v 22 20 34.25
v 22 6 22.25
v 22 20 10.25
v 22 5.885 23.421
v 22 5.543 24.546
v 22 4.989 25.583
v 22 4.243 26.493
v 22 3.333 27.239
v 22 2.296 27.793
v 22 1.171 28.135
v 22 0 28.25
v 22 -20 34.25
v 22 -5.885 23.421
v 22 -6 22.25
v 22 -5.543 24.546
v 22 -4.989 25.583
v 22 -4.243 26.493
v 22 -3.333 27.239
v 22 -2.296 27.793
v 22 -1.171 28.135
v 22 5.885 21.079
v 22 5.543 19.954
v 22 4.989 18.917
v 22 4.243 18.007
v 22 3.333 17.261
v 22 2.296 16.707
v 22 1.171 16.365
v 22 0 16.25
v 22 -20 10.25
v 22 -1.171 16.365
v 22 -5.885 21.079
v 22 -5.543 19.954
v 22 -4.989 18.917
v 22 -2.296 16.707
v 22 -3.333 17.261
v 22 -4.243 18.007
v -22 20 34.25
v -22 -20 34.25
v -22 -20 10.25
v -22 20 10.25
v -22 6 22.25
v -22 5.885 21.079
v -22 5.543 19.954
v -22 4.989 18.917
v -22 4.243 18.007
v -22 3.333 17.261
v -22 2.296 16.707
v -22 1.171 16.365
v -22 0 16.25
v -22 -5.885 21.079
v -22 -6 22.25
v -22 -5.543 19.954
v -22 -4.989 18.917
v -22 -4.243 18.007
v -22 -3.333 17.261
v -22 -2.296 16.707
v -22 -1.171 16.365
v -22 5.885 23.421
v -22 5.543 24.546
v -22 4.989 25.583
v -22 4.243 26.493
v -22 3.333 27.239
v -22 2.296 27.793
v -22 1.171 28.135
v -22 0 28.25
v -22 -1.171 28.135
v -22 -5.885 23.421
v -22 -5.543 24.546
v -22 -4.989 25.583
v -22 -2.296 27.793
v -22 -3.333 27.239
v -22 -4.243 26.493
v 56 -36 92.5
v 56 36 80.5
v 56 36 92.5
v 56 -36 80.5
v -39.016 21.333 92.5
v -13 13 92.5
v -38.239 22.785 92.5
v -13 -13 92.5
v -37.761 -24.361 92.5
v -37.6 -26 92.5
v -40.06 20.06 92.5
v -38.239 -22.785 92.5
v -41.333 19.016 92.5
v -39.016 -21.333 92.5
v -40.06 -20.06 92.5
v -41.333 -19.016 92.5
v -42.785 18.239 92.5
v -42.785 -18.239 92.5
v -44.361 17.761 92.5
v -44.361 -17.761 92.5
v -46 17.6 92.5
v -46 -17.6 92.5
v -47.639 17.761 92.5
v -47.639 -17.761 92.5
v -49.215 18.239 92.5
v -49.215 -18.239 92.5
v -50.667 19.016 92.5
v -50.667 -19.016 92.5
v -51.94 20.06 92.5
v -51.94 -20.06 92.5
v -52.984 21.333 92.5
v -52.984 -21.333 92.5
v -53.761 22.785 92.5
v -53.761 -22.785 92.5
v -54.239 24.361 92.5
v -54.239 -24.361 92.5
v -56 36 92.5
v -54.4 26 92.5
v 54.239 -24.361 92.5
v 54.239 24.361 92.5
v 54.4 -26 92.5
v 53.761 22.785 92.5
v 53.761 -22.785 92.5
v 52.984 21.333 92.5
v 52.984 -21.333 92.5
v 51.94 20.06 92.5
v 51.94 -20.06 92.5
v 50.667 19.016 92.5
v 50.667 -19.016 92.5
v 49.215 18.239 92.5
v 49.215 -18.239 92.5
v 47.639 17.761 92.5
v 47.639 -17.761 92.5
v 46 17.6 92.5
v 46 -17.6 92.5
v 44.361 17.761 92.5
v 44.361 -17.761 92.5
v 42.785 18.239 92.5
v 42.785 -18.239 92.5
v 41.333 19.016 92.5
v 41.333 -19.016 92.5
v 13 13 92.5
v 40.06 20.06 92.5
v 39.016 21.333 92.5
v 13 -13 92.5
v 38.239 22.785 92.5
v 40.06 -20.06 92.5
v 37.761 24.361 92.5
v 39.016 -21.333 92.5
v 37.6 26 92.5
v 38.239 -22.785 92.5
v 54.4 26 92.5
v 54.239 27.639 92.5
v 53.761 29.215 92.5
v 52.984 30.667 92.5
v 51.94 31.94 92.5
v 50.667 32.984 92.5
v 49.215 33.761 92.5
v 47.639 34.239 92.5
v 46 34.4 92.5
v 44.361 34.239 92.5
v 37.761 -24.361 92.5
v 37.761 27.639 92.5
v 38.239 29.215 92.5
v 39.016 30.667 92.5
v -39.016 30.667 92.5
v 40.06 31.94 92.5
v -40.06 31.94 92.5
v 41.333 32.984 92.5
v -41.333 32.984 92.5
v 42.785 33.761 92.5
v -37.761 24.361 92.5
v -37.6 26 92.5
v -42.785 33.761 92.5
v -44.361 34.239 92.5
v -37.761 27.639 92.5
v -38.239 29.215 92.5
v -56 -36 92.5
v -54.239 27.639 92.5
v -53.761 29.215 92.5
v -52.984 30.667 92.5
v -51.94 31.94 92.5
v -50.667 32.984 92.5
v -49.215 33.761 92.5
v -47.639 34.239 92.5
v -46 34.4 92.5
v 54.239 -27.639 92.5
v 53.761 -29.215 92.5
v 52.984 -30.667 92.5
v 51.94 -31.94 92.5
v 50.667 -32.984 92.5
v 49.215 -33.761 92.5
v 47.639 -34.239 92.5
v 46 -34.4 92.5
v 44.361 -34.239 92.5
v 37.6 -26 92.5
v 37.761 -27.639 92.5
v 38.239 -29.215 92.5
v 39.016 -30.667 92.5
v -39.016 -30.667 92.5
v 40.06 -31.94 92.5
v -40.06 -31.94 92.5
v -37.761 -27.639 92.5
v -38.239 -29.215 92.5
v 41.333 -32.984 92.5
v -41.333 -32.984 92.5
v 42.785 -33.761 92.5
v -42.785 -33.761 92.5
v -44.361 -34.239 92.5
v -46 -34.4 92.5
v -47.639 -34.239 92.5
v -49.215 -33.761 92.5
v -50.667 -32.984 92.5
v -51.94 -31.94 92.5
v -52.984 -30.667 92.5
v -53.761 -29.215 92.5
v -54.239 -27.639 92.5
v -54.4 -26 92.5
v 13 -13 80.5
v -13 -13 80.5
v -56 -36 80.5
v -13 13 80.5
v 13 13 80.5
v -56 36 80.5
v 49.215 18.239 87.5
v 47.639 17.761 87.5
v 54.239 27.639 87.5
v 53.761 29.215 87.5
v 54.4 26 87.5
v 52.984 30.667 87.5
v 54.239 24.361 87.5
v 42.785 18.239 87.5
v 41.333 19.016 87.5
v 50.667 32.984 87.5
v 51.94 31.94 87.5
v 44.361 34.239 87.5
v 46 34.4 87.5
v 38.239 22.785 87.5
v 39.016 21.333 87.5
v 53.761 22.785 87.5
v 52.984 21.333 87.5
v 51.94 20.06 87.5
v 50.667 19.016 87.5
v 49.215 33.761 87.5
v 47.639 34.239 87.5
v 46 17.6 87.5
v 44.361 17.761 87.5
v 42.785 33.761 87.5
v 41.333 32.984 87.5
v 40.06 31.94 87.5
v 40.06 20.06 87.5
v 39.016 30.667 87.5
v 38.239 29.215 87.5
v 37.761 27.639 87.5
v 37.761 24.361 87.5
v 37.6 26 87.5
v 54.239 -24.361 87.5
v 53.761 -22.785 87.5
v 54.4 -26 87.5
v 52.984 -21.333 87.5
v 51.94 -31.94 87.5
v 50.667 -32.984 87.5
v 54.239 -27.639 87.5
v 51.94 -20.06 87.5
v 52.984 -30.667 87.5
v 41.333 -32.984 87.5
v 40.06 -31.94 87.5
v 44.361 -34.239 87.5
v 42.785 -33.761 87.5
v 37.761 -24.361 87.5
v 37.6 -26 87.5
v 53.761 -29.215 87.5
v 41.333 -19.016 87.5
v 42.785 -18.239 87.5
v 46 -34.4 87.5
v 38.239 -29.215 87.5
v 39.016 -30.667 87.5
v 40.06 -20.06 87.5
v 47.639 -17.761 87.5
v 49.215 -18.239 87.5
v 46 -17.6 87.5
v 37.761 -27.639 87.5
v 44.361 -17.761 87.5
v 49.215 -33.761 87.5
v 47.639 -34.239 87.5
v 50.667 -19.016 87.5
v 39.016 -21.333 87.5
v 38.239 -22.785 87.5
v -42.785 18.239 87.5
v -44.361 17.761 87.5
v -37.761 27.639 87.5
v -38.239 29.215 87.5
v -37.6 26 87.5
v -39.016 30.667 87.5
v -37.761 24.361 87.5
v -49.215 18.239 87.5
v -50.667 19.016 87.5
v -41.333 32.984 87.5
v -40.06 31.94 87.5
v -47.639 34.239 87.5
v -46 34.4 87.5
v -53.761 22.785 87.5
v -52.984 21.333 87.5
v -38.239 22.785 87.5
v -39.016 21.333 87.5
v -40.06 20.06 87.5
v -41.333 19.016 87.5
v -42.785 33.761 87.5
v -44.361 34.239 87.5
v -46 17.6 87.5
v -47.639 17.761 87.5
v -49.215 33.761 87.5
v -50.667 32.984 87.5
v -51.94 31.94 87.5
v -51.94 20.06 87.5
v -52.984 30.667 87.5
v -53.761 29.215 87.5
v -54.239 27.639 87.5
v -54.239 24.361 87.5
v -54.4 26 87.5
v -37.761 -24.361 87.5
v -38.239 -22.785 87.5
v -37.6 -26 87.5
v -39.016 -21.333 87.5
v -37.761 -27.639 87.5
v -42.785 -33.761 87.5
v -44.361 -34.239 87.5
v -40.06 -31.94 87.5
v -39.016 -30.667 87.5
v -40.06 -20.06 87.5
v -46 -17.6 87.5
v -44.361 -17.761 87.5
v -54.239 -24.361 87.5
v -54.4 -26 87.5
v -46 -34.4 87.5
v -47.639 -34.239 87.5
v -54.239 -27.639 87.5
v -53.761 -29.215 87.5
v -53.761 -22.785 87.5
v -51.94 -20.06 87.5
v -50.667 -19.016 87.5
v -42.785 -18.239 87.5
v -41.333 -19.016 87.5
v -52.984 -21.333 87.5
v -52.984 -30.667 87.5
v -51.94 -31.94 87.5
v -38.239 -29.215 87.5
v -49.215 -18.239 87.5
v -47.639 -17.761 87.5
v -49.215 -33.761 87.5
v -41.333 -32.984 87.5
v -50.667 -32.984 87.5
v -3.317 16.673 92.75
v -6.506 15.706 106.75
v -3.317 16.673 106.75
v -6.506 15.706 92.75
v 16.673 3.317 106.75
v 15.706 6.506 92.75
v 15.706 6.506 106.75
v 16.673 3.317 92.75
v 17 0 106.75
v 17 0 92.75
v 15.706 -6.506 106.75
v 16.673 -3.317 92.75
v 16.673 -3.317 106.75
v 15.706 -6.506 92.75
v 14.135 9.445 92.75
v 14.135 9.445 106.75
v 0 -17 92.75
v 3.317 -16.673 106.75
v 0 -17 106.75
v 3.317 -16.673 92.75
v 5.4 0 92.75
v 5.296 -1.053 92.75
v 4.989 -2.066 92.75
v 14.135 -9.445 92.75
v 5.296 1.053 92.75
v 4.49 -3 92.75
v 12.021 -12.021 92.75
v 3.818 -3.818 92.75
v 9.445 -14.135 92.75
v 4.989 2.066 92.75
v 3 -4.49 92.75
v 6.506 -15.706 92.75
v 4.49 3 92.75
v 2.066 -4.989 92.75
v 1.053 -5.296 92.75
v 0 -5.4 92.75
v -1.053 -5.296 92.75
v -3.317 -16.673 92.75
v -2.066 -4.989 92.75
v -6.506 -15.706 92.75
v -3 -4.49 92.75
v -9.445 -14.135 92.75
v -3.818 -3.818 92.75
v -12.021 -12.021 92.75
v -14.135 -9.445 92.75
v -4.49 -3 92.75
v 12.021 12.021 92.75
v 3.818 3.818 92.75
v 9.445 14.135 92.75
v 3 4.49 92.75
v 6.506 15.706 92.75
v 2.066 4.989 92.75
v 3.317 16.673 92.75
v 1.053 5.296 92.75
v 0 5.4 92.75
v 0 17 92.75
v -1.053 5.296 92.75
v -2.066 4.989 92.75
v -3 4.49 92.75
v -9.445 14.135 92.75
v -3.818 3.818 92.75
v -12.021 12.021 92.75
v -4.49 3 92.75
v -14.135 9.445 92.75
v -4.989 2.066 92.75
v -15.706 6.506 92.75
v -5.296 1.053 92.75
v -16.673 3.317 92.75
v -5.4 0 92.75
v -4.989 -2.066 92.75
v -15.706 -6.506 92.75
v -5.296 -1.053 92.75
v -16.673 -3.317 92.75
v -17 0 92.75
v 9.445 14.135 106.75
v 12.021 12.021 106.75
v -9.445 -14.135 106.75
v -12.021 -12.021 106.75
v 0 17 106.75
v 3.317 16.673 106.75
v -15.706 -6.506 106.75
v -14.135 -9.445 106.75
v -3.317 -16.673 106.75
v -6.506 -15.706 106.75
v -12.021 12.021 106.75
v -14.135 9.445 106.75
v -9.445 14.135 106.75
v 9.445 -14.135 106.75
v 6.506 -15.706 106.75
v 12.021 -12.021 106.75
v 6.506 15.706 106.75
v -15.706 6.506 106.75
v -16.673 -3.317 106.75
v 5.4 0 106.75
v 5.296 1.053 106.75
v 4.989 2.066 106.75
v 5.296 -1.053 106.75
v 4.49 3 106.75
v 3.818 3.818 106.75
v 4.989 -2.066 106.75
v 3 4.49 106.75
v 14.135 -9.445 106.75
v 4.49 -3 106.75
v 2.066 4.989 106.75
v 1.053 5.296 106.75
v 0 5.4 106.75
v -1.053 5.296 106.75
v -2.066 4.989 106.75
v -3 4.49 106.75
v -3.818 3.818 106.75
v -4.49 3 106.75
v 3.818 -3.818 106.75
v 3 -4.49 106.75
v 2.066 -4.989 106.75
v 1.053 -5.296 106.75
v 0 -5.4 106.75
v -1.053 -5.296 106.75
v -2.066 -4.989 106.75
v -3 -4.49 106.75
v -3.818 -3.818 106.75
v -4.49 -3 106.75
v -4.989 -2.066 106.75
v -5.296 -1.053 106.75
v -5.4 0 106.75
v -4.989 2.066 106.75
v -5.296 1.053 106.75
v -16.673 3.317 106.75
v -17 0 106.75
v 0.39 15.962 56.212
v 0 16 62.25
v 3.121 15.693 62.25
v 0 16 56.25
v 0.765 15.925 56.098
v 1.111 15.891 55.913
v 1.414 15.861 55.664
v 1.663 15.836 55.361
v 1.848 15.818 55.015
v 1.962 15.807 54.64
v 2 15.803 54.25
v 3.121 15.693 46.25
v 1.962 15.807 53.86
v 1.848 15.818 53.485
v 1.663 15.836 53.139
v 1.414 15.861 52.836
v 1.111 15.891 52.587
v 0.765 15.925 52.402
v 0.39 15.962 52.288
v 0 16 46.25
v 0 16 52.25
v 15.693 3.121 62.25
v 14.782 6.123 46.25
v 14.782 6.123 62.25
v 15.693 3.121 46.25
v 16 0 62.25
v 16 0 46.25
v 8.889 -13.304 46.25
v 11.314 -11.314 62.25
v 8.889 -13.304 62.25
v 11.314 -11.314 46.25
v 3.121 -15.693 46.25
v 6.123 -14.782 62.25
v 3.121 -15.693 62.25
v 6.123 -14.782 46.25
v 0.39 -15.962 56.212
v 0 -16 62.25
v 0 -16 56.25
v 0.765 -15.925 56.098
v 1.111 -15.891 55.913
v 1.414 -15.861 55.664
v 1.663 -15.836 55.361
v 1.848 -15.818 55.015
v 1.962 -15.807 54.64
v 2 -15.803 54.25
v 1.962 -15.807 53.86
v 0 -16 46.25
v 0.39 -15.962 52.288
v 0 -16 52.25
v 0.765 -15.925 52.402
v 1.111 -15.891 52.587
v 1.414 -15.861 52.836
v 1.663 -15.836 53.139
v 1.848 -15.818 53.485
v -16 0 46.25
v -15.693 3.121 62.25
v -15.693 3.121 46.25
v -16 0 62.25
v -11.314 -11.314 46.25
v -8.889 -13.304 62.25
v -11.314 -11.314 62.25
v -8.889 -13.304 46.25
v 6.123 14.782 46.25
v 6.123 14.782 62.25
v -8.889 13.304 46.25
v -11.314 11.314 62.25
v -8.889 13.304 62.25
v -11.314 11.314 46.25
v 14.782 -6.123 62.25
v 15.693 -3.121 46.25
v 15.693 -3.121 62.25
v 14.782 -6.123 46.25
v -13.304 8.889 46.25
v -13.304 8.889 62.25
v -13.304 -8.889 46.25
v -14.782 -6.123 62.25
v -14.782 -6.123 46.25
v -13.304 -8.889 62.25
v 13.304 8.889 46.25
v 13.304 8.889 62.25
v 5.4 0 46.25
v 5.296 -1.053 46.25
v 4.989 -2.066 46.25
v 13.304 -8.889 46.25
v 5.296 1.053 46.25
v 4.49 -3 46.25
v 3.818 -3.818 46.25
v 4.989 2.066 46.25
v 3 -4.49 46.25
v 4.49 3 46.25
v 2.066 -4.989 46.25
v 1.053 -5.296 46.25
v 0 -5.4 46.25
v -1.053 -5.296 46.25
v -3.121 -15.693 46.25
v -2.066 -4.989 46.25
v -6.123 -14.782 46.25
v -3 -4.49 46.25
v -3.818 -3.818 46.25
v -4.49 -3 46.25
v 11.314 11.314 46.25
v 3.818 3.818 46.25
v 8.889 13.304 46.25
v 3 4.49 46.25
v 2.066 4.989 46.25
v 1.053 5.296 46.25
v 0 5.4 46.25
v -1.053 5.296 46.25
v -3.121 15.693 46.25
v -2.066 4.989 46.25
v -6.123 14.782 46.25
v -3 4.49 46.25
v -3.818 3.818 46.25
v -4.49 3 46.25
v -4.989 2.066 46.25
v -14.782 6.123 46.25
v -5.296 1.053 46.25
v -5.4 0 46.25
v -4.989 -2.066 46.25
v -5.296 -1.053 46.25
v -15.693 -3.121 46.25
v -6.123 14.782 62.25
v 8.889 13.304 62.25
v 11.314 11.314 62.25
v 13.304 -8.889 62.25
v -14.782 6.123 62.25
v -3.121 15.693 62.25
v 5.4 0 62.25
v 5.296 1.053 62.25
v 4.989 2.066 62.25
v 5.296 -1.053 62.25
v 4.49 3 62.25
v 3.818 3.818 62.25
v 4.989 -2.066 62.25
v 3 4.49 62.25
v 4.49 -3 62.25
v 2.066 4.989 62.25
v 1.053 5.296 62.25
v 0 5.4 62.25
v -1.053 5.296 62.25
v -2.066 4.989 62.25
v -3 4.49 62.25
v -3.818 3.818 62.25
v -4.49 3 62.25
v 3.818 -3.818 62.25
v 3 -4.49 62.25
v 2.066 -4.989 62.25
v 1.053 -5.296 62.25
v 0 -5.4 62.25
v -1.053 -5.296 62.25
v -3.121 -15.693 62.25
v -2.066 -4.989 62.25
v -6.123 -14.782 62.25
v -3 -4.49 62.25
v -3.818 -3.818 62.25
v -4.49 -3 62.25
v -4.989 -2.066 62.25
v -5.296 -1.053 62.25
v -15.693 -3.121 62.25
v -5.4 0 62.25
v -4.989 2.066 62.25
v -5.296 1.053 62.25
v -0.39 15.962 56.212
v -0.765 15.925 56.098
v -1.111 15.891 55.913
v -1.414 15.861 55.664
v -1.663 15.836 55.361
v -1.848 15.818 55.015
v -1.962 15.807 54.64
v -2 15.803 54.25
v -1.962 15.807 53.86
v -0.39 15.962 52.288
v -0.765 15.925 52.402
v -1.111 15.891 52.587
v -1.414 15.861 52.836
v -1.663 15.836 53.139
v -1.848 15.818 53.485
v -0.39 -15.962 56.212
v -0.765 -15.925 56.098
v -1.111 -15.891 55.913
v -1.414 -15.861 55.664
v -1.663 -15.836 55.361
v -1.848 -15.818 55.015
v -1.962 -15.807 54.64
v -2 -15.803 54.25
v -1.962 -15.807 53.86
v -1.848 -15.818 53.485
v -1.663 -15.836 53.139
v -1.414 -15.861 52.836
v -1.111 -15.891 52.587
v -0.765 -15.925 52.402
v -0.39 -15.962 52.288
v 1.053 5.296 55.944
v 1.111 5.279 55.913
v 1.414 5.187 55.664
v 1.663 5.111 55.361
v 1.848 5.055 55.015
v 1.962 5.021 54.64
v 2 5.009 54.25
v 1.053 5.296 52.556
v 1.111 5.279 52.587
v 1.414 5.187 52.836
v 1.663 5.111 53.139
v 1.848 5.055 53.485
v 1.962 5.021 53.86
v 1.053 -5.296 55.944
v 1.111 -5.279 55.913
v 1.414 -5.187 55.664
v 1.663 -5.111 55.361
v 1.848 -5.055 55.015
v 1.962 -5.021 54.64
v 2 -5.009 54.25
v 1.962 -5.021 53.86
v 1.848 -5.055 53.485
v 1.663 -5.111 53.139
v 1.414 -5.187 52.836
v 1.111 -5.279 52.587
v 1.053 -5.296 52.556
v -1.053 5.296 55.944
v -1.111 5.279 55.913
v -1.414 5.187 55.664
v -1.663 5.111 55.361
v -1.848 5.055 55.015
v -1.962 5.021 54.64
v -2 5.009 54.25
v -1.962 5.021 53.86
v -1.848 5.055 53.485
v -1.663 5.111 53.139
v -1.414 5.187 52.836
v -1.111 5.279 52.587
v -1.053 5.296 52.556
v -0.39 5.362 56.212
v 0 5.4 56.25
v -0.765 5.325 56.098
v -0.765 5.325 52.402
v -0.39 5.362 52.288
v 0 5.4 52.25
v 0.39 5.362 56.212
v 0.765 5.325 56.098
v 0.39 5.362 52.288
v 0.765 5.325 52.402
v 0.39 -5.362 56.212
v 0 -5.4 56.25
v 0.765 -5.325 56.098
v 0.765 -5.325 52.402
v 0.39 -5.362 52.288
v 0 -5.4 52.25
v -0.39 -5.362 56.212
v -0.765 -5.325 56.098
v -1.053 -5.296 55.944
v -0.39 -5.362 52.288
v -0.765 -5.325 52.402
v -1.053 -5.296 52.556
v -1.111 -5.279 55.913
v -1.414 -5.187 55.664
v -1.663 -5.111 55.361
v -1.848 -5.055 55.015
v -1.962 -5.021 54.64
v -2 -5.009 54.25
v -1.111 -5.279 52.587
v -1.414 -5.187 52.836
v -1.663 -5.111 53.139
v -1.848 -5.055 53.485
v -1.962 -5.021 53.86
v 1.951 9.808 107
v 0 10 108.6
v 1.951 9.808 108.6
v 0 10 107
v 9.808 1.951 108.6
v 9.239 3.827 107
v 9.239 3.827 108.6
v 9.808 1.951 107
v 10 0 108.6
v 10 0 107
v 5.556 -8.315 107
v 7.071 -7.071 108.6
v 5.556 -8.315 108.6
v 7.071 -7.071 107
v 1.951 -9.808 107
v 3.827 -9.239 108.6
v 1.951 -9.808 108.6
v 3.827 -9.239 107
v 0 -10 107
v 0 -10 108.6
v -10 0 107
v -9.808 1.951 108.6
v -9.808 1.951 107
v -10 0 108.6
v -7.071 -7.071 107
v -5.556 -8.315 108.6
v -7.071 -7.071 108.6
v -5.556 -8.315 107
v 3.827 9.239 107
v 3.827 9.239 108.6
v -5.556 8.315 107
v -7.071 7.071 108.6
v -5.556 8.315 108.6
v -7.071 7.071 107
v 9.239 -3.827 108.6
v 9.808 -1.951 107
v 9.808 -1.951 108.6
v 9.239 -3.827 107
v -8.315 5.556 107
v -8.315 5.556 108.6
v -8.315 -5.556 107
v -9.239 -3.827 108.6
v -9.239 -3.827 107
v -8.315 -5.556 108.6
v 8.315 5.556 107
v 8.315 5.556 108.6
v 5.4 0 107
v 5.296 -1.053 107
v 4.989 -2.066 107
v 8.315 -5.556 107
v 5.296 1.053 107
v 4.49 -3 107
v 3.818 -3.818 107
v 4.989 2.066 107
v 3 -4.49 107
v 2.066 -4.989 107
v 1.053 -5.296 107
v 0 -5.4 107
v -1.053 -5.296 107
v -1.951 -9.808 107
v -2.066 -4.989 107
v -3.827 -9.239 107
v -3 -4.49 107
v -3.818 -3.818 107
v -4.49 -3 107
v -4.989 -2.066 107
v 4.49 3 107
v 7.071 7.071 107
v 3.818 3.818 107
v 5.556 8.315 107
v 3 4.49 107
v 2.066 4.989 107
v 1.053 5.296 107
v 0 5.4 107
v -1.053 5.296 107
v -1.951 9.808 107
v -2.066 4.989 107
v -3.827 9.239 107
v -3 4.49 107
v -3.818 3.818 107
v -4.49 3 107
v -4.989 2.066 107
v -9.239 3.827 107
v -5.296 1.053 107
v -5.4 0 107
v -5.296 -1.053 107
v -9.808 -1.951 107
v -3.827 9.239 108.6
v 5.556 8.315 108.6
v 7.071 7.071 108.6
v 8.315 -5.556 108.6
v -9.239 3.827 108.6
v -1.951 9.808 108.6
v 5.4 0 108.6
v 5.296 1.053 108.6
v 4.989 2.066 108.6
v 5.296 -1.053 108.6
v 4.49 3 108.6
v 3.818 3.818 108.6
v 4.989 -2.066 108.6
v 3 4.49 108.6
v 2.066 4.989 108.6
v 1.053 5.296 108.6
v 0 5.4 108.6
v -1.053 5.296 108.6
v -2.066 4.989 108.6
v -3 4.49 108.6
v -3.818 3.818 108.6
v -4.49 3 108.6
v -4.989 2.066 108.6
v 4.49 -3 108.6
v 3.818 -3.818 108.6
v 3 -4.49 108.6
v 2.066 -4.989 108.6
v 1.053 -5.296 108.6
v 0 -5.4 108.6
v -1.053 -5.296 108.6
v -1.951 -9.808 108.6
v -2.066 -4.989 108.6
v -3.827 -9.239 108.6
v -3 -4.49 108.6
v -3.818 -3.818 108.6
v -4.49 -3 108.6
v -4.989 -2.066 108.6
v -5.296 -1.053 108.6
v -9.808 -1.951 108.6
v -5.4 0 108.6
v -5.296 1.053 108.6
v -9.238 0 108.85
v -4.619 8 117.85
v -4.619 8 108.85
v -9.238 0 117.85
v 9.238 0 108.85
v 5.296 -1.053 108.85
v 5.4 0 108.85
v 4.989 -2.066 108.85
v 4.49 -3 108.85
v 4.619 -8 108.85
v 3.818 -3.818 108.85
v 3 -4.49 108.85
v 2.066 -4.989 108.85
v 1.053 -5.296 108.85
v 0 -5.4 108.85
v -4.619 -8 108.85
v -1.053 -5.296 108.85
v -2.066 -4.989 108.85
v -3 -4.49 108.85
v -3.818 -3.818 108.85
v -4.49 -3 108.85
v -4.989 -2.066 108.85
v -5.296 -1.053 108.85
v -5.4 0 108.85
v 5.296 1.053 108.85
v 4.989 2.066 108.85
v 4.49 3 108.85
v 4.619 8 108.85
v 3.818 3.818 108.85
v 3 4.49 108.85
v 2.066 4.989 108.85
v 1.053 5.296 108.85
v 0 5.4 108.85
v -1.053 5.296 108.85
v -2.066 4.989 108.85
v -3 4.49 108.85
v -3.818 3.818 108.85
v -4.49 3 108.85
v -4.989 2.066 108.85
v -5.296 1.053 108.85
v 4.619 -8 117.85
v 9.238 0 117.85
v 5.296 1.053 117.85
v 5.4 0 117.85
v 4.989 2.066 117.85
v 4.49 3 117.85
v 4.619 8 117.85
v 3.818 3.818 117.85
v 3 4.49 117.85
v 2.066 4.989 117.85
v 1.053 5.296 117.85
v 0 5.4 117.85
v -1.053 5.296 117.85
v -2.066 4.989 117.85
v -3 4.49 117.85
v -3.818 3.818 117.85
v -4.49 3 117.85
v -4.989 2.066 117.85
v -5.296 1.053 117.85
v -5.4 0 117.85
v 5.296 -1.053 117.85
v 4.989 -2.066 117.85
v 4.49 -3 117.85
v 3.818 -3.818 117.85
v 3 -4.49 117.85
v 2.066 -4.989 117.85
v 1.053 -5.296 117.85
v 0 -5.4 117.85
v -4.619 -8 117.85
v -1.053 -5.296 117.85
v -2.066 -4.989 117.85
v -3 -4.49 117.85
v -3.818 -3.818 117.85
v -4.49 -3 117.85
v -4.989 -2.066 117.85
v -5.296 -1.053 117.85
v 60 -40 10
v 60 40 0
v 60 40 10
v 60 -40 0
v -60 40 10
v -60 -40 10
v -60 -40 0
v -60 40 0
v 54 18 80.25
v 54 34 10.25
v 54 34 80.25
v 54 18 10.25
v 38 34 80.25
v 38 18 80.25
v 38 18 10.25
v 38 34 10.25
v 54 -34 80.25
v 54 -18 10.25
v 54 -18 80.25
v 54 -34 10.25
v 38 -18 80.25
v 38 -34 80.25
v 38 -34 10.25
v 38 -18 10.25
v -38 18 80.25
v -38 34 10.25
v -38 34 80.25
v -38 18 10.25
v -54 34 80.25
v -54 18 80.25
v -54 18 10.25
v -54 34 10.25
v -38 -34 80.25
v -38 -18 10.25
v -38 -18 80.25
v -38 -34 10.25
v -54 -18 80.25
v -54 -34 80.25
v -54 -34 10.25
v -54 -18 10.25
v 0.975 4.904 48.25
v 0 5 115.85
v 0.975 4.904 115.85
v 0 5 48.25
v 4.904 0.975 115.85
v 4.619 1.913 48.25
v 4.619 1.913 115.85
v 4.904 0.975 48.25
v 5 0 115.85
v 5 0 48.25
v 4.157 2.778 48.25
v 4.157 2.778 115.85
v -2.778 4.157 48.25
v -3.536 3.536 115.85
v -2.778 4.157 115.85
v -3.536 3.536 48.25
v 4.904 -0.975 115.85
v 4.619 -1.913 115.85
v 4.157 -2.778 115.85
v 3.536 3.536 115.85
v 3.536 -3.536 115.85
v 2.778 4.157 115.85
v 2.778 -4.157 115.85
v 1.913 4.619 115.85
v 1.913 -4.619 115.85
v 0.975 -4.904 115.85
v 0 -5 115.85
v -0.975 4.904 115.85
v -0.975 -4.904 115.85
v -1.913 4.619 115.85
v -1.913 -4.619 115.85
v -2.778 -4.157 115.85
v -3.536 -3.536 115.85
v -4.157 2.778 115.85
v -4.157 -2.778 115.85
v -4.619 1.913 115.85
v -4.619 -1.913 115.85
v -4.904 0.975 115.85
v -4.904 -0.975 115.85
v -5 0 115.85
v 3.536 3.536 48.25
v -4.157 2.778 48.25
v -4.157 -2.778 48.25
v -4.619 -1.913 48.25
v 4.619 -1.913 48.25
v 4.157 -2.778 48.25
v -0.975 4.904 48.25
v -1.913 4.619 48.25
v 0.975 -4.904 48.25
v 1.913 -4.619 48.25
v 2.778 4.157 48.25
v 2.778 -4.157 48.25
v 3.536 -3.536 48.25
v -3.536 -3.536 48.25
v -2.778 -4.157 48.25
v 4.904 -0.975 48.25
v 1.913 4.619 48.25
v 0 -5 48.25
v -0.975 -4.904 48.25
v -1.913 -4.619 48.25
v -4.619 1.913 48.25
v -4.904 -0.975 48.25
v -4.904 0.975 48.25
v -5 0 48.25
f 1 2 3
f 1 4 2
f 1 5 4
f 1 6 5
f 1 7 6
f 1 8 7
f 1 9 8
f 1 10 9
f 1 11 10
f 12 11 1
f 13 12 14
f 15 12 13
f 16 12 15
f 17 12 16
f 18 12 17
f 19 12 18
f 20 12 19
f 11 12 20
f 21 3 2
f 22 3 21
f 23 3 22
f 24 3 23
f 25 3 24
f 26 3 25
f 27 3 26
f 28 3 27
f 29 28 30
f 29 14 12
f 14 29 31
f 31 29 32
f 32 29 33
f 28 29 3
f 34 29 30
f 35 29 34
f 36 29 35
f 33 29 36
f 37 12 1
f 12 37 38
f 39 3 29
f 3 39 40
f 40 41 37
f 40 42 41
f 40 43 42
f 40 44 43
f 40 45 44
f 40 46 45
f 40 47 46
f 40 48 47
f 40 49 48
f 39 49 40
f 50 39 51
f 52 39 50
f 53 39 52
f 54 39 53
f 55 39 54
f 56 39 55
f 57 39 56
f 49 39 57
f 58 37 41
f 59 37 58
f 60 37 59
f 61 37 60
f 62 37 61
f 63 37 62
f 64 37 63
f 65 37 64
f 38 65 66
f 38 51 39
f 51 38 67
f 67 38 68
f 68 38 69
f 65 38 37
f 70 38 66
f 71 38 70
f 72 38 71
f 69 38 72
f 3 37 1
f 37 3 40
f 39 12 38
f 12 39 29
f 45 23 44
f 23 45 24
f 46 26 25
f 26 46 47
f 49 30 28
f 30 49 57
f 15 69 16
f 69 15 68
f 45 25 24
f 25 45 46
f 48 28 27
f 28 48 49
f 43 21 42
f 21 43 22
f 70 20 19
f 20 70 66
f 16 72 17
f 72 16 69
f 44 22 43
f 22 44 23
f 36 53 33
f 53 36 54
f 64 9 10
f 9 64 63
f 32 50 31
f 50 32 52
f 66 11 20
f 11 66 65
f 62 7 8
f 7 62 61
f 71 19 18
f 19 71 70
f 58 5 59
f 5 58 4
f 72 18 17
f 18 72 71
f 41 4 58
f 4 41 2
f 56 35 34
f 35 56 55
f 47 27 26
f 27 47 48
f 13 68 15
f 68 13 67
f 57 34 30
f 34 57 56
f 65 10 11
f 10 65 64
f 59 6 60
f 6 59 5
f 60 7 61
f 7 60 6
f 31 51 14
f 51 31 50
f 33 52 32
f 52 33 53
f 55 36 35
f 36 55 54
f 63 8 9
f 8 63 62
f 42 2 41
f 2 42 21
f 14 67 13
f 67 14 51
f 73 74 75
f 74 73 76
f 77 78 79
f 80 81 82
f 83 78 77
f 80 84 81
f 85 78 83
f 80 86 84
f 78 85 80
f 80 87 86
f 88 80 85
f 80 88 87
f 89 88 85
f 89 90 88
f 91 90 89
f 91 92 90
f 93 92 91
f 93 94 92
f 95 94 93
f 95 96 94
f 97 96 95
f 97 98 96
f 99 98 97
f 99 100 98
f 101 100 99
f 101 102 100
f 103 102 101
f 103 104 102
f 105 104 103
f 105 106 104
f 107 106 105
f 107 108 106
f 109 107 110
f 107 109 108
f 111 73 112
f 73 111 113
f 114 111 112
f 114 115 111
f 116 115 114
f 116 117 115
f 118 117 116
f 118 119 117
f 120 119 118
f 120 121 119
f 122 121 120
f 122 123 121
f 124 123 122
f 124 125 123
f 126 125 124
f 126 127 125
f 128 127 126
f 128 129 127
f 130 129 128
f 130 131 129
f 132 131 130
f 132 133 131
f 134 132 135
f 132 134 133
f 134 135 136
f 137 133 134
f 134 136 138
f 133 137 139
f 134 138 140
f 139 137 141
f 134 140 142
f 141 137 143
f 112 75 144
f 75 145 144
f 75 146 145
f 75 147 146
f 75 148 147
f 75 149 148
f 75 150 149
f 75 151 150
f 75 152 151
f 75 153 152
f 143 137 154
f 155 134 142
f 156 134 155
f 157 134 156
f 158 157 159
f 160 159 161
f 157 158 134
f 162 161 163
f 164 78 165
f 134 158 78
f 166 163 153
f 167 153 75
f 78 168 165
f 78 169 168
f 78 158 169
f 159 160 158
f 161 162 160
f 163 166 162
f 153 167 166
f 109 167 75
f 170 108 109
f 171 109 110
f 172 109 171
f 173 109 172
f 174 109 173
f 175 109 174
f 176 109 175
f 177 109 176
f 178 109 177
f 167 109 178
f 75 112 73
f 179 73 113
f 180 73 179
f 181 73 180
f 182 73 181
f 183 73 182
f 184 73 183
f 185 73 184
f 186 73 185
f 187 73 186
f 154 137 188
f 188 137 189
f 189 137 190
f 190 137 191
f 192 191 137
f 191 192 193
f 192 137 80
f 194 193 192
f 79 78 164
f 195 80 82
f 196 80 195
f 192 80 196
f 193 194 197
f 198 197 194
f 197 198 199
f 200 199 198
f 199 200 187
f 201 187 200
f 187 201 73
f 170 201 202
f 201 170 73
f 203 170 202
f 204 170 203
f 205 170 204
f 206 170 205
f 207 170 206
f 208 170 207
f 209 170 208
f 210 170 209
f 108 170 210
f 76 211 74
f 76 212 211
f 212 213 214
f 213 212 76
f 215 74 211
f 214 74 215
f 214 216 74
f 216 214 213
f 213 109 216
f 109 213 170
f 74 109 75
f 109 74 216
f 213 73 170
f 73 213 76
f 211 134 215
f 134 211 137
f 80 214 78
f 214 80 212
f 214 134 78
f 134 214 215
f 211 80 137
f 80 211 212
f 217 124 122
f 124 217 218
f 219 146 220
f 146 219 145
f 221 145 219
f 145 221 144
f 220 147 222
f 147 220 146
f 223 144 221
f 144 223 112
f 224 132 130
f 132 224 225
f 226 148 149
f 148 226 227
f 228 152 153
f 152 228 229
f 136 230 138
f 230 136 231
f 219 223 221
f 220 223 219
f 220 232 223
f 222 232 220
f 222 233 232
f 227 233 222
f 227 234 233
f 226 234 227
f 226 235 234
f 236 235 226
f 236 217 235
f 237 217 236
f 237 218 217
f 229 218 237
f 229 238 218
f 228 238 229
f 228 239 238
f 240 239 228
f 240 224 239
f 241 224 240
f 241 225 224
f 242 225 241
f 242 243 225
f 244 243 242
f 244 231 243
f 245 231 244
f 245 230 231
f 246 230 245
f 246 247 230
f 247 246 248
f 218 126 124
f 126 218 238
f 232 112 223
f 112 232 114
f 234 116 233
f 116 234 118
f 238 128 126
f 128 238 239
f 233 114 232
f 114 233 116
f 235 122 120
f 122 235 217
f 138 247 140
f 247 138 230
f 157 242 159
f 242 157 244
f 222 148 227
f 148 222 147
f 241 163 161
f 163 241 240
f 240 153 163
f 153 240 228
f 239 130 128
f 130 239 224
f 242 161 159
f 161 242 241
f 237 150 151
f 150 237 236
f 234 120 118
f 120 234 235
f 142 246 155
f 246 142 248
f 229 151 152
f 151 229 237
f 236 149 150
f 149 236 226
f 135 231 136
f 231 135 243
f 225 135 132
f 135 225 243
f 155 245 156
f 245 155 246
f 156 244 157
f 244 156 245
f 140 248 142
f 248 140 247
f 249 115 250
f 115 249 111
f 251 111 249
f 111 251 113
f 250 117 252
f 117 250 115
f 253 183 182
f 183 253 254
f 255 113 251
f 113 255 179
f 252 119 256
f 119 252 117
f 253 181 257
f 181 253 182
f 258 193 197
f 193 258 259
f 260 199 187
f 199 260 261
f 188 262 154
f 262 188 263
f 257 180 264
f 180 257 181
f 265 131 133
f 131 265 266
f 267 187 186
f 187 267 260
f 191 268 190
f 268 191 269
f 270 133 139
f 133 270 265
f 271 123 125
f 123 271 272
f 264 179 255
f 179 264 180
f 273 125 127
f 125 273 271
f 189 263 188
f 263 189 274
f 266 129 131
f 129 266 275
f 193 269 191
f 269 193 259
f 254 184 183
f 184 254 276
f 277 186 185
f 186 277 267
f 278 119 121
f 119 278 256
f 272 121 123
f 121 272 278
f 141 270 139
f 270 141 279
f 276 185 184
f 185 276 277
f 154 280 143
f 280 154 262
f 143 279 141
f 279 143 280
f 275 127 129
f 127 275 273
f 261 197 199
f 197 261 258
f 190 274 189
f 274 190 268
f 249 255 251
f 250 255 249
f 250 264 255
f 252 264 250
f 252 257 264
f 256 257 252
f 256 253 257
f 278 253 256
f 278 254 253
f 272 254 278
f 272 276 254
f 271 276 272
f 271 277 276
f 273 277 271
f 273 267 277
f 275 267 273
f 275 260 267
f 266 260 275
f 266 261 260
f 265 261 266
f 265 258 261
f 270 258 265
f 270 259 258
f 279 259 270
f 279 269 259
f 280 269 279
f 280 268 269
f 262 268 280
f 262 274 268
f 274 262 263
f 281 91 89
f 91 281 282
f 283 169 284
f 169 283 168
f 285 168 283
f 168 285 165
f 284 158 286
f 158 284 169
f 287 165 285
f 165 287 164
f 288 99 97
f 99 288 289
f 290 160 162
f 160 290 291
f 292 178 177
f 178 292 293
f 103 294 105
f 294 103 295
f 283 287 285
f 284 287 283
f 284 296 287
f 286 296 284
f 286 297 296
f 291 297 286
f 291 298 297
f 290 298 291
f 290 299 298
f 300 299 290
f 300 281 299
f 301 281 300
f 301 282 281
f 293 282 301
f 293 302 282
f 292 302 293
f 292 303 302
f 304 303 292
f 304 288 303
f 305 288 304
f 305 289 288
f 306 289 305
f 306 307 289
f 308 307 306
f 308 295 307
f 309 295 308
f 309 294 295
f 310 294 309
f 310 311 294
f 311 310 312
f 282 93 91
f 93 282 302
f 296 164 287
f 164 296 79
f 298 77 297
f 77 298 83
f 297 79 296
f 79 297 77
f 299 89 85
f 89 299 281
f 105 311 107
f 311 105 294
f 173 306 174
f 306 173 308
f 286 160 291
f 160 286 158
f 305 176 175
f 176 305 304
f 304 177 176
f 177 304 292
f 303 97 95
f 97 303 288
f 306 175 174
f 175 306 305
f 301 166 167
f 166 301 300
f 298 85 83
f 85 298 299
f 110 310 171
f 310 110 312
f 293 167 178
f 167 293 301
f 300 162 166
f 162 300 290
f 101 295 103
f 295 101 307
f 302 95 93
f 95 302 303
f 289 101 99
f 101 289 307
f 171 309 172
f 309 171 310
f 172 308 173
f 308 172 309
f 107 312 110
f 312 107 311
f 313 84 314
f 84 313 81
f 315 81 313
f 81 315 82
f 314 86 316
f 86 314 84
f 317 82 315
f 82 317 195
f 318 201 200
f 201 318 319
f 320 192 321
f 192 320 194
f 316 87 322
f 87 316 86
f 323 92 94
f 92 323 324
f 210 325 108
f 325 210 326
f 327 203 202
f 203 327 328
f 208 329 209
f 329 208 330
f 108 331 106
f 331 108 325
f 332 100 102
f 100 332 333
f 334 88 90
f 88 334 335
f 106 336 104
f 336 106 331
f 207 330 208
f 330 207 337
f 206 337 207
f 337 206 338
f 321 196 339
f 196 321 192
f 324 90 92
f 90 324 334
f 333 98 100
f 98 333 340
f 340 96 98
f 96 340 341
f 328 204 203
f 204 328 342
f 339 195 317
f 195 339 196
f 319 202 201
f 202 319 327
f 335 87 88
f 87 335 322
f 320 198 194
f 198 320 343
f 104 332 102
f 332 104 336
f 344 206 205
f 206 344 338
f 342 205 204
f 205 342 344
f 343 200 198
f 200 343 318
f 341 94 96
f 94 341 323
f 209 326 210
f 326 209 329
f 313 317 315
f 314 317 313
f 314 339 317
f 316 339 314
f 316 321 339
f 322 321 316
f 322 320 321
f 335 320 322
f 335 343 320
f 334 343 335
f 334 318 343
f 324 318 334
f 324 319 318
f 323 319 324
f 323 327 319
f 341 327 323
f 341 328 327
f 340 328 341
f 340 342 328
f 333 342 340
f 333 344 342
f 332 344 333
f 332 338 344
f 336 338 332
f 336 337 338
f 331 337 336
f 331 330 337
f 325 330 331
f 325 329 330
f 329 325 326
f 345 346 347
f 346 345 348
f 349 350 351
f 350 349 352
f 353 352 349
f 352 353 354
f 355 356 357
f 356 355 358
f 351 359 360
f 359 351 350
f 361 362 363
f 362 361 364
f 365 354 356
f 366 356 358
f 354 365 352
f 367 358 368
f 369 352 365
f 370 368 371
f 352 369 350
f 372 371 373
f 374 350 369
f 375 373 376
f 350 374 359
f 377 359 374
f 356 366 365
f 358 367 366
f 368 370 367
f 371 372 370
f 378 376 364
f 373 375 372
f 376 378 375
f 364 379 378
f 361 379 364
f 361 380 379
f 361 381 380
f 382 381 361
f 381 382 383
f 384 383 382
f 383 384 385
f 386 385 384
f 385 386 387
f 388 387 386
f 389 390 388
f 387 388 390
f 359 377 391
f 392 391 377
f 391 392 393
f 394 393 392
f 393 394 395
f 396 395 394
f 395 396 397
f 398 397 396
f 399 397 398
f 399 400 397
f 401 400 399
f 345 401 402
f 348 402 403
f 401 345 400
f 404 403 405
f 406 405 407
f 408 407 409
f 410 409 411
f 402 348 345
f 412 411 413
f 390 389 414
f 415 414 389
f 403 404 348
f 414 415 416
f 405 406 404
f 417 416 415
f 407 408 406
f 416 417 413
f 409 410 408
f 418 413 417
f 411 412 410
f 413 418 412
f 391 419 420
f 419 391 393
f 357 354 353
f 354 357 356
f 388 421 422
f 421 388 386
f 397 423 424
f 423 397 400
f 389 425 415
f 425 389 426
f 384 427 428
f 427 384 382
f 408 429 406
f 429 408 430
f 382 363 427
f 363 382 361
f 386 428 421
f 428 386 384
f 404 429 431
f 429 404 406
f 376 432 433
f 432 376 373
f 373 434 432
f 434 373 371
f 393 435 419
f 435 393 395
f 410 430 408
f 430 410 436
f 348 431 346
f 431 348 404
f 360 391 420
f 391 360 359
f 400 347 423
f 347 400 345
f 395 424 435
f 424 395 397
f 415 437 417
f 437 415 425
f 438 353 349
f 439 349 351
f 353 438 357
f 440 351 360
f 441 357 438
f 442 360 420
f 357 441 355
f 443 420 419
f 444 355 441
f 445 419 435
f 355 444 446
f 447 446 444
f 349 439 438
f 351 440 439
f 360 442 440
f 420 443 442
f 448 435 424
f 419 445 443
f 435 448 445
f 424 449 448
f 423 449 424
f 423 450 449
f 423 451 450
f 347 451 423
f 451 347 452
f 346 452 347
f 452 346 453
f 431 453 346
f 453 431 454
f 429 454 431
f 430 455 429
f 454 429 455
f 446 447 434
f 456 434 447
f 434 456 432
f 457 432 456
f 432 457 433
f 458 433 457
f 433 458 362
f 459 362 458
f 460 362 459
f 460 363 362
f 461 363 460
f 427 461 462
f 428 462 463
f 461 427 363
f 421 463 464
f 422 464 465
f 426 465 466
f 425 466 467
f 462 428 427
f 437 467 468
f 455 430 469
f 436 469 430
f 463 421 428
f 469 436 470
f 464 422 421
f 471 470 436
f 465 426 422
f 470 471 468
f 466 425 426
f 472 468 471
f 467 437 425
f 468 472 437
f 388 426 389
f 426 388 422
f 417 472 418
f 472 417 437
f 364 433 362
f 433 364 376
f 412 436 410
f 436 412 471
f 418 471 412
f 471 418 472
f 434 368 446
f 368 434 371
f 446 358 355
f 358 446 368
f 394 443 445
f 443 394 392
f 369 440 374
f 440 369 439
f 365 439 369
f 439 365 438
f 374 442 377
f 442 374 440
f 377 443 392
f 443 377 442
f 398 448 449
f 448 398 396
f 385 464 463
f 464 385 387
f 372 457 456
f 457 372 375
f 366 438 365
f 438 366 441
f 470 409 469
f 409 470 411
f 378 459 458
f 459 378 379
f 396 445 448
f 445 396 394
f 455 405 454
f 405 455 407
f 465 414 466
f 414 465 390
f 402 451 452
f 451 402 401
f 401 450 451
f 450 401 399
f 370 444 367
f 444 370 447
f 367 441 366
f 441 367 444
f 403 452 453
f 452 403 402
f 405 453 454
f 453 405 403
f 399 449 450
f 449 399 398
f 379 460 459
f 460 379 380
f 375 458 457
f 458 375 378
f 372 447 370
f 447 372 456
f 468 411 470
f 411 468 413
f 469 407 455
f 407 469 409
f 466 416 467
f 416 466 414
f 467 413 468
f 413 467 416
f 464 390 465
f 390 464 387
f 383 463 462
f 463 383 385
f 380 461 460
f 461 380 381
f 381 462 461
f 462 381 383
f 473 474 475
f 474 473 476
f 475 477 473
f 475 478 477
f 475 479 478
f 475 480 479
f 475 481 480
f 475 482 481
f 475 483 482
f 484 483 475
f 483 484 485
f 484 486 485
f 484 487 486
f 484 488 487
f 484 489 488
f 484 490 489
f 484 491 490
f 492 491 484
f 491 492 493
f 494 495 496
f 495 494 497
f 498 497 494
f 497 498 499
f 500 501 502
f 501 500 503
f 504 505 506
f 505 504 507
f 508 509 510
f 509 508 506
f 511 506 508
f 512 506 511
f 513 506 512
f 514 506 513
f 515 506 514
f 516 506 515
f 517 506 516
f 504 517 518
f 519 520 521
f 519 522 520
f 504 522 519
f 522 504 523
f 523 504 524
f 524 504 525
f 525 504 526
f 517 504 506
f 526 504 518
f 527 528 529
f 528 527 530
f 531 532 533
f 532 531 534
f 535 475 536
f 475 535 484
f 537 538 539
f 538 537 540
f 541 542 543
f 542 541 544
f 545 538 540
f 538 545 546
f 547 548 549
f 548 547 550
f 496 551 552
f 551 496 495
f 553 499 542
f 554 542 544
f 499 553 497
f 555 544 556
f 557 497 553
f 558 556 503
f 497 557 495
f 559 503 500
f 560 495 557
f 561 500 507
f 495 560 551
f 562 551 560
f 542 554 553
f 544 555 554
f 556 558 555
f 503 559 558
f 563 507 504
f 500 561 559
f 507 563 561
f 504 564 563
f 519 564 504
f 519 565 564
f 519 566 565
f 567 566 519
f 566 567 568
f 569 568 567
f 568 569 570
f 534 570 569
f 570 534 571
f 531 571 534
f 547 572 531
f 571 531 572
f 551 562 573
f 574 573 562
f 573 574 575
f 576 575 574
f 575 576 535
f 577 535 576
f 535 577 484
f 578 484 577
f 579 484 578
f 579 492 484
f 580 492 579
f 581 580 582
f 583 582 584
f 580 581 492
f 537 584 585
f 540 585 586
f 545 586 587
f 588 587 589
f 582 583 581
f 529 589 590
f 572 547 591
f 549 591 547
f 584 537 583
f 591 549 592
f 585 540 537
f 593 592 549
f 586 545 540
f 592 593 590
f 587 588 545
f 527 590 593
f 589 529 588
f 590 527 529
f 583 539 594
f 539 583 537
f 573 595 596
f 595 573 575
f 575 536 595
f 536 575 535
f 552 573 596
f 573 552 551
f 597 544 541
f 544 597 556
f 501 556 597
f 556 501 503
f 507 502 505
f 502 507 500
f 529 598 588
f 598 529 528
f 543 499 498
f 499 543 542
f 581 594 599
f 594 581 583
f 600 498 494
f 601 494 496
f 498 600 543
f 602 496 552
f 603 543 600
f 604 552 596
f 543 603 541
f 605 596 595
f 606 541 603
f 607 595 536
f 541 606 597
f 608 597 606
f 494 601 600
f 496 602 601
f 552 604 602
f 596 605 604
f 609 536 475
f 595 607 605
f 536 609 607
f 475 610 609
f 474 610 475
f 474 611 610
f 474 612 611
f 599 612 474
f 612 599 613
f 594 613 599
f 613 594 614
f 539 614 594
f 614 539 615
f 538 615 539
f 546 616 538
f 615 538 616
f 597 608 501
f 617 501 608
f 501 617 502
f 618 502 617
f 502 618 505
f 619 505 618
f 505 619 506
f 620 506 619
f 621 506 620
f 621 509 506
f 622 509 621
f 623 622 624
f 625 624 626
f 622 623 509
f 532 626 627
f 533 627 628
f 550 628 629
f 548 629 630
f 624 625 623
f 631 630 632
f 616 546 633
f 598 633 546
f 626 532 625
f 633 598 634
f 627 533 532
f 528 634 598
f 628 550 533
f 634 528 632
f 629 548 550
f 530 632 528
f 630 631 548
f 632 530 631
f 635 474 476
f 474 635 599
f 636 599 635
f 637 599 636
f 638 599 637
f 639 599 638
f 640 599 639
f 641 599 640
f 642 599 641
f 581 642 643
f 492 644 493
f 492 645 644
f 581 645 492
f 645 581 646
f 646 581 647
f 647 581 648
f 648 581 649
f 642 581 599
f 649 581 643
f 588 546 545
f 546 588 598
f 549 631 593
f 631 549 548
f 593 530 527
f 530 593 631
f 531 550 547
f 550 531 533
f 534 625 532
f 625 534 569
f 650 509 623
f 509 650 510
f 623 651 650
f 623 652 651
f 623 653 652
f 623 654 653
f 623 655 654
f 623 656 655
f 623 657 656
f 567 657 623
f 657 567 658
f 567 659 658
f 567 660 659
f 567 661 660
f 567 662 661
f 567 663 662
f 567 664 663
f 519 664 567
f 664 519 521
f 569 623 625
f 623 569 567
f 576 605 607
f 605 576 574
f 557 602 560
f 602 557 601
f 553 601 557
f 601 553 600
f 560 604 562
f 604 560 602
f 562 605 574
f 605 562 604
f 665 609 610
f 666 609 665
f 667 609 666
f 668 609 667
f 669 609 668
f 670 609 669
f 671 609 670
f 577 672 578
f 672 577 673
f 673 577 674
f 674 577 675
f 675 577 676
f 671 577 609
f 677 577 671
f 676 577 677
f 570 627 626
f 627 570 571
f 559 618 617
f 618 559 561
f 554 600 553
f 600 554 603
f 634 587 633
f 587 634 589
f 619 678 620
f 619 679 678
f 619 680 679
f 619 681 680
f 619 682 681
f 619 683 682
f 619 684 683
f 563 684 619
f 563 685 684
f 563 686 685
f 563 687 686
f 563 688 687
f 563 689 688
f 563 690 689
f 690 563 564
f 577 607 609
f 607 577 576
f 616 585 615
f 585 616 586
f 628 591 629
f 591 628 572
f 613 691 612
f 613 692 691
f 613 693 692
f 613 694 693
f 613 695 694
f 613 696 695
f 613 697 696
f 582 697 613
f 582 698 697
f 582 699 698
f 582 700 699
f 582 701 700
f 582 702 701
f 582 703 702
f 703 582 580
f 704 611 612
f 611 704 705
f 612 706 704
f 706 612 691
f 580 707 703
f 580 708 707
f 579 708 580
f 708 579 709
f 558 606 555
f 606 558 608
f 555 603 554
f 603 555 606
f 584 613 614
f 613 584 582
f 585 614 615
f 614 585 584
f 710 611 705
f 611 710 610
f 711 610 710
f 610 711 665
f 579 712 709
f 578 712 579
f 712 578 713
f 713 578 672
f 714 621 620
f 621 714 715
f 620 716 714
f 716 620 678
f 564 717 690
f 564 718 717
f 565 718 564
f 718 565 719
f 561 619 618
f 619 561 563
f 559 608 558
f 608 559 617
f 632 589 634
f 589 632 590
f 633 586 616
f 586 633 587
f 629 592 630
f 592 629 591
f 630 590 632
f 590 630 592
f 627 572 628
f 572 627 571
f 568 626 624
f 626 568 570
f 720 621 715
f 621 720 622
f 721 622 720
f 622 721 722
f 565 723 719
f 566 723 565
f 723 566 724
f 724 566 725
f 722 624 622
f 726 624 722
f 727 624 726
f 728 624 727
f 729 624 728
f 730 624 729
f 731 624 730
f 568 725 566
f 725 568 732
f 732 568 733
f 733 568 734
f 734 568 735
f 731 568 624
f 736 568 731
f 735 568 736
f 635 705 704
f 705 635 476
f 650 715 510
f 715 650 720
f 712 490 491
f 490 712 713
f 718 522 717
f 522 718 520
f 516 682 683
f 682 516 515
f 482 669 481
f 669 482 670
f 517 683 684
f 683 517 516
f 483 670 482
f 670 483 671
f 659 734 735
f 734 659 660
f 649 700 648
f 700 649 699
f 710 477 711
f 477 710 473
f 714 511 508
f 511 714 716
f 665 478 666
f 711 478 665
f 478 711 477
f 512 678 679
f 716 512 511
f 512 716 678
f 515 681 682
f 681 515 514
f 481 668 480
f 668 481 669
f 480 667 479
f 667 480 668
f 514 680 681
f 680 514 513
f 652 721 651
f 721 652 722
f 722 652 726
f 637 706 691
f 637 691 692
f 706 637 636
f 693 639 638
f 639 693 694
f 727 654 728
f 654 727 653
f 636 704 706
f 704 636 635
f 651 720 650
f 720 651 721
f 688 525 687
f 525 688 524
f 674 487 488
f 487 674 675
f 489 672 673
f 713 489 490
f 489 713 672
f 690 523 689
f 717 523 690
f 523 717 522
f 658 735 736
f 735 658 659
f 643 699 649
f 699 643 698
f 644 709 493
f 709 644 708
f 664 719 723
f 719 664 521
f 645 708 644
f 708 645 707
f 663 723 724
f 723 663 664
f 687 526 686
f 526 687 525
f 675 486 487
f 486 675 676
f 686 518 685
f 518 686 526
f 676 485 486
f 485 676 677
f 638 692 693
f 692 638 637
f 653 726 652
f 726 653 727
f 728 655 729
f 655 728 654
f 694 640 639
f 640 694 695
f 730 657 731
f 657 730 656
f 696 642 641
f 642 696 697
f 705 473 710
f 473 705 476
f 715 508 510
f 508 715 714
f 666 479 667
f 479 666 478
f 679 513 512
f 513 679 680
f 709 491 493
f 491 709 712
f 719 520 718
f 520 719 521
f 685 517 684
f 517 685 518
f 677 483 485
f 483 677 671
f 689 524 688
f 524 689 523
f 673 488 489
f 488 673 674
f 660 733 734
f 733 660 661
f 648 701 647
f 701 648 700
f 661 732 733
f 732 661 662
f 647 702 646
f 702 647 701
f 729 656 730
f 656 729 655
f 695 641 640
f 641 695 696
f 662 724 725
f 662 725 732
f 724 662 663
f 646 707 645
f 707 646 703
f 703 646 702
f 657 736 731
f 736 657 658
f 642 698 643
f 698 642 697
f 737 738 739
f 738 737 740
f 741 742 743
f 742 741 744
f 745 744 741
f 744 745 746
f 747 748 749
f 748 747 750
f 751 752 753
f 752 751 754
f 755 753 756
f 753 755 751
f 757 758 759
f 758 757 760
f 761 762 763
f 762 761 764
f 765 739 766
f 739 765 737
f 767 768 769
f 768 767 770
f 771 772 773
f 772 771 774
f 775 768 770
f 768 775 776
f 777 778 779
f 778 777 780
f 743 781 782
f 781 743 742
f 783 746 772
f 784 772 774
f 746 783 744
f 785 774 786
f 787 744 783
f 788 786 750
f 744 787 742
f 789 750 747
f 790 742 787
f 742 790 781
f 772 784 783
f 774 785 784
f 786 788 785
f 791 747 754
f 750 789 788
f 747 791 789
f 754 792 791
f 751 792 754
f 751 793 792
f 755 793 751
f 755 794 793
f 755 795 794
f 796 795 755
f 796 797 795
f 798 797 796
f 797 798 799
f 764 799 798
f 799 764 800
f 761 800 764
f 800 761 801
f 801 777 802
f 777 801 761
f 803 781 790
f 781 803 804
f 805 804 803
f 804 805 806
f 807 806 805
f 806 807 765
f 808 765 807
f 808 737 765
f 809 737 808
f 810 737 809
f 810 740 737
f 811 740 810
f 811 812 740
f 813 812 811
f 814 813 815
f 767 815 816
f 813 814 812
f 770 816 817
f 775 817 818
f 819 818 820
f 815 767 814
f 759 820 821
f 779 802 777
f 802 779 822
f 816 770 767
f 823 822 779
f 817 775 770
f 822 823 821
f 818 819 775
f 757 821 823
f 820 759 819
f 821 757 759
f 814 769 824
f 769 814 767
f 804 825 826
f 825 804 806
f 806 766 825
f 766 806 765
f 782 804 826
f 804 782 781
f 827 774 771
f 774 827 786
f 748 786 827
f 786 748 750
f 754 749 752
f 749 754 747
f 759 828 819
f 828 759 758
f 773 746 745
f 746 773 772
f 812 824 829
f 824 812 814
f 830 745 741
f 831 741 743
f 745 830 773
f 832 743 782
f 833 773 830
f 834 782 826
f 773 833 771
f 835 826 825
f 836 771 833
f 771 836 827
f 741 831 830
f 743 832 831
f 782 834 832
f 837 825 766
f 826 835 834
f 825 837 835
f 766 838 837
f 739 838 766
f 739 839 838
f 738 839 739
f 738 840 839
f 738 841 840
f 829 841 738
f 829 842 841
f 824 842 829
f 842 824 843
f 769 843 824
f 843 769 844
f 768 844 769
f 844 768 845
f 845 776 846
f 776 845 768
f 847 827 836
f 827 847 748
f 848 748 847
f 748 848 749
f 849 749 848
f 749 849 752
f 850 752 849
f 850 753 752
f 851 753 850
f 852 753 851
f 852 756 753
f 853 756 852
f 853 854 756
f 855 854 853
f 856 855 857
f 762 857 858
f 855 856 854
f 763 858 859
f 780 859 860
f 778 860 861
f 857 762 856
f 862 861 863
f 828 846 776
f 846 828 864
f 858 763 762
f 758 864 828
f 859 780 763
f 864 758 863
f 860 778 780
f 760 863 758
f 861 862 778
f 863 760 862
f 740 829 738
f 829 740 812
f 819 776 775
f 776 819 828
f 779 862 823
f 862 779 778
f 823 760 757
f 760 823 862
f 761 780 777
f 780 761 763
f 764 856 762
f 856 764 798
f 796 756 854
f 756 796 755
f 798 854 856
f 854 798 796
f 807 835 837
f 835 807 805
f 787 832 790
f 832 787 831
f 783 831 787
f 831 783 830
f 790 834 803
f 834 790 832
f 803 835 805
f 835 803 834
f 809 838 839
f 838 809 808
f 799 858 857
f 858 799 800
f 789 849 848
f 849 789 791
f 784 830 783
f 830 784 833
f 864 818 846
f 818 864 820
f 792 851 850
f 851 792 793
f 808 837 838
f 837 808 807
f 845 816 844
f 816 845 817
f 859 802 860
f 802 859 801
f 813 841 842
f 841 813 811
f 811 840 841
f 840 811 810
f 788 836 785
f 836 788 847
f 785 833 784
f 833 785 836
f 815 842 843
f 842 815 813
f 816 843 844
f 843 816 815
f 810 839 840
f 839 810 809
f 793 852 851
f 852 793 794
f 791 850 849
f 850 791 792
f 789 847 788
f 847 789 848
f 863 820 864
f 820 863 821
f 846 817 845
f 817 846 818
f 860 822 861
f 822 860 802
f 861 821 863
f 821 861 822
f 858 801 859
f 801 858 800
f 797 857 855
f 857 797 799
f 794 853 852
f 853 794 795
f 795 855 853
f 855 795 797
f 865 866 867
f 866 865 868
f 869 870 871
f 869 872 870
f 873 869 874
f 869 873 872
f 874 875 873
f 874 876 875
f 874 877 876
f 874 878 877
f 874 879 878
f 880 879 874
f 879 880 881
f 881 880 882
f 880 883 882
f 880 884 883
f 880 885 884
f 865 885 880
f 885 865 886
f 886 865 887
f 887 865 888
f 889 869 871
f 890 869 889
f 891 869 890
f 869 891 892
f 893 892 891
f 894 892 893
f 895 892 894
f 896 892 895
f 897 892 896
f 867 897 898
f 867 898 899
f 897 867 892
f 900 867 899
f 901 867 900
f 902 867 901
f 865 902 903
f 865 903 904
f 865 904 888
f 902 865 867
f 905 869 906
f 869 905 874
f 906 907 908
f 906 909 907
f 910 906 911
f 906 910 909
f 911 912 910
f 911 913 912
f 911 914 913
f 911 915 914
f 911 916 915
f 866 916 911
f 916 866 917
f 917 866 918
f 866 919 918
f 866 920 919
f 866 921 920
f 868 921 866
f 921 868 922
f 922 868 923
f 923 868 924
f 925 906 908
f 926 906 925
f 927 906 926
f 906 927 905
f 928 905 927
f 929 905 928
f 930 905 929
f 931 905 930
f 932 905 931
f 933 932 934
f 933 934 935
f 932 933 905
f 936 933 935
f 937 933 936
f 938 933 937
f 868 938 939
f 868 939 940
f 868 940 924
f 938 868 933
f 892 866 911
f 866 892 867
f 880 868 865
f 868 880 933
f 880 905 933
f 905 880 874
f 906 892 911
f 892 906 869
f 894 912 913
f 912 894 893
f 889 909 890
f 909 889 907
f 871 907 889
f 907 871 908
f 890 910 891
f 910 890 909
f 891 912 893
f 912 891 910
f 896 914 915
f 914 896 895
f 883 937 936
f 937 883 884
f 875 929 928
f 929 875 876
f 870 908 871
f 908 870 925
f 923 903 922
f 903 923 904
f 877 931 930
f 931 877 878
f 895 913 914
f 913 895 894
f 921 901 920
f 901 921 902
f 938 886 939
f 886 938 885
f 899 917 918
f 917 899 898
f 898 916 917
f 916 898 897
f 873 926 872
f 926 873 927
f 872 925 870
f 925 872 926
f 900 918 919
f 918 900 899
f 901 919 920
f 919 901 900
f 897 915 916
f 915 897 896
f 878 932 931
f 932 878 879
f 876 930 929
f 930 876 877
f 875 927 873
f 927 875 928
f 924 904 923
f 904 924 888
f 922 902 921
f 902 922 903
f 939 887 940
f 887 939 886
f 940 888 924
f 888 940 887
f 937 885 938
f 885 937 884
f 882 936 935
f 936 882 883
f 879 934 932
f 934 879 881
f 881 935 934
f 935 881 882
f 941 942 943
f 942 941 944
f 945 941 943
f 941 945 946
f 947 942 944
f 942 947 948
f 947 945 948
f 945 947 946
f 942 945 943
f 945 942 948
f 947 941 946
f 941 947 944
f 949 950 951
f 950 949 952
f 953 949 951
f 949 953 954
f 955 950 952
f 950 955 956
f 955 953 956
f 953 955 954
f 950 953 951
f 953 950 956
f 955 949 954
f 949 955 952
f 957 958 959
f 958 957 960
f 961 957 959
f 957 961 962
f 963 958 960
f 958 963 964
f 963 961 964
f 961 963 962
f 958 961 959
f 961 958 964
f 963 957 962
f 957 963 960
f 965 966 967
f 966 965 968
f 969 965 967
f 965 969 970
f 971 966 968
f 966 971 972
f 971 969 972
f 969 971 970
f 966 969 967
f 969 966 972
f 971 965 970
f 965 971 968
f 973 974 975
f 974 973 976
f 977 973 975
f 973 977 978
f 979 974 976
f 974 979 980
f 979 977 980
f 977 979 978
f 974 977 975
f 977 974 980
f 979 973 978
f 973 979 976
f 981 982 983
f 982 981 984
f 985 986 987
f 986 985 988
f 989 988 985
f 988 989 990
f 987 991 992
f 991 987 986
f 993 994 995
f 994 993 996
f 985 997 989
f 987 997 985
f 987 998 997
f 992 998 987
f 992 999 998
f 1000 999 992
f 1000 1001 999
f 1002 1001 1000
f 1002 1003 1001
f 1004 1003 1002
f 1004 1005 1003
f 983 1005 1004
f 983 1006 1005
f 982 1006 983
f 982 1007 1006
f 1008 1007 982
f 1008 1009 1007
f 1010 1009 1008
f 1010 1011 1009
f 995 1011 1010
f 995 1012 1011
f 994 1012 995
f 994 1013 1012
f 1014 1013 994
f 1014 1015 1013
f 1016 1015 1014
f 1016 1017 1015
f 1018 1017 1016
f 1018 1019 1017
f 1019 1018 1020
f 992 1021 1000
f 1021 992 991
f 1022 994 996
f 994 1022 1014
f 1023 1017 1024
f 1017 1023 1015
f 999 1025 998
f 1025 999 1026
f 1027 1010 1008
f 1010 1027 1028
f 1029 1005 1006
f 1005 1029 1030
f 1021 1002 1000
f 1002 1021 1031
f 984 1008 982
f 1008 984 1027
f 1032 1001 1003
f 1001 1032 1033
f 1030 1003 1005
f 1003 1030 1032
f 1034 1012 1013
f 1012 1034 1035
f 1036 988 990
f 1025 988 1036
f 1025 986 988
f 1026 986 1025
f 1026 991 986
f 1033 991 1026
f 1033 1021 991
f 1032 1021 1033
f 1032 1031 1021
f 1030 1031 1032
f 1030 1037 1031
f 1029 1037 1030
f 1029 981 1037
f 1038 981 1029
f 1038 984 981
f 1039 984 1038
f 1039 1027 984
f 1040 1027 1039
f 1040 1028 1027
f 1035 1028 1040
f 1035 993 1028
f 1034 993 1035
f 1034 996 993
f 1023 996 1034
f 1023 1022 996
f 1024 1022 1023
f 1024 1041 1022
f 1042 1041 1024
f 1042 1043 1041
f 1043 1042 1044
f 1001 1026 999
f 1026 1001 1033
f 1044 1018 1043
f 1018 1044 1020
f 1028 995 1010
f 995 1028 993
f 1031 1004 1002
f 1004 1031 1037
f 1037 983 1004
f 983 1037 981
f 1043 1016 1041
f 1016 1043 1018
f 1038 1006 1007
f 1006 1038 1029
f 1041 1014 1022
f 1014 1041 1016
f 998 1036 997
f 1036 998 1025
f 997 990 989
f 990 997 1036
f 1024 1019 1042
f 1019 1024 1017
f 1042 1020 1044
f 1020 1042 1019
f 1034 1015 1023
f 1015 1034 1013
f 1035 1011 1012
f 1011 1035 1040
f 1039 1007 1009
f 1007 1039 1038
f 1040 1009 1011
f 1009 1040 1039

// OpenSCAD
$fn = 32;

// ------------------------------------------------------------------------
// Arbor press fixture: screw d10, posts 70 mm, gap 12 mm
// Every part is its own module, assembly() places every instance.
// ------------------------------------------------------------------------

// --- part 1 ---
module press_bed() {
  difference() {
    translate([-60, -40, 0]) cube([120, 80, 10]);
  }
}

// --- part 2 ---
module anvil_block() {
  difference() {
    translate([-22, -20, 0]) cube([44, 40, 24]);
    translate([0, 0, 12]) rotate([0, 90, 0]) cylinder(h = 46, d = 12, center = true);
  }
}

// --- part 3 ---
module press_post_a() {
  translate([-8, -8, 0]) cube([16, 16, 70]);
}

// --- part 4 ---
module press_post_b() {
  translate([-8, -8, 0]) cube([16, 16, 70]);
}

// --- part 5 ---
module press_post_c() {
  translate([-8, -8, 0]) cube([16, 16, 70]);
}

// --- part 6 ---
module press_post_d() {
  translate([-8, -8, 0]) cube([16, 16, 70]);
}

// --- part 7 ---
module press_frame() {
  difference() {
    translate([-56, -36, 0]) cube([112, 72, 12]);
    translate([-13, -13, -1]) cube([26, 26, 14]);
    translate([46, 26, 7]) cylinder(h = 6, d = 16.8);
    translate([46, -26, 7]) cylinder(h = 6, d = 16.8);
    translate([-46, 26, 7]) cylinder(h = 6, d = 16.8);
    translate([-46, -26, 7]) cylinder(h = 6, d = 16.8);
  }
}

// --- part 8 ---
module guide_ring() {
  difference() {
      translate([0, 0, 0]) cylinder(h = 14, d = 34);
      translate([0, 0, -1]) cylinder(h = 16, d = 10.8);
    }
}

// --- part 9 ---
module press_screw() {
  translate([0, 0, -33.8]) cylinder(h = 67.6, d = 10);
}

// --- part 10 ---
module press_head() {
  difference() {
    cylinder(h = 16, d = 32);
    translate([0, 0, -1]) cylinder(h = 18, d = 10.8);
    translate([0, 0, 8]) rotate([90, 0, 0]) cylinder(h = 34, d = 4, center = true);
  }
}

// --- part 11 ---
module nut_washer() {
  difference() {
      translate([0, 0, 0]) cylinder(h = 1.6, d = 20);
      translate([0, 0, -1]) cylinder(h = 3.6, d = 10.8);
    }
}

// --- part 12 ---
module press_nut() {
  difference() {
    linear_extrude(height = 9) polygon(points = [[9.238, 0], [4.619, 8], [-4.619, 8], [-9.238, 0], [-4.619, -8], [4.619, -8]]);
    translate([0, 0, -1]) cylinder(h = 11, d = 10.8);
  }
}

// --- assembly ---
module assembly() {
  color([0.80, 0.24, 0.20]) translate([0, 0, 0]) rotate([0, 0, 0]) press_bed();
  color([0.20, 0.45, 0.75]) translate([0, 0, 10.25]) rotate([0, 0, 0]) anvil_block();
  color([0.25, 0.62, 0.32]) translate([46, 26, 10.25]) rotate([0, 0, 0]) press_post_a();
  color([0.92, 0.70, 0.18]) translate([46, -26, 10.25]) rotate([0, 0, 0]) press_post_b();
  color([0.58, 0.35, 0.70]) translate([-46, 26, 10.25]) rotate([0, 0, 0]) press_post_c();
  color([0.16, 0.66, 0.66]) translate([-46, -26, 10.25]) rotate([0, 0, 0]) press_post_d();
  color([0.85, 0.48, 0.18]) translate([0, 0, 80.5]) rotate([0, 0, 0]) press_frame();
  color([0.55, 0.60, 0.65]) translate([0, 0, 92.75]) rotate([0, 0, 0]) guide_ring();
  color([0.75, 0.30, 0.55]) translate([0, 0, 82.05]) rotate([0, 0, 0]) press_screw();
  color([0.42, 0.52, 0.28]) translate([0, 0, 46.25]) rotate([0, 0, 0]) press_head();
  color([0.80, 0.24, 0.20]) translate([0, 0, 107]) rotate([0, 0, 0]) nut_washer();
  color([0.20, 0.45, 0.75]) translate([0, 0, 108.85]) rotate([0, 0, 0]) press_nut();
}

assembly();
